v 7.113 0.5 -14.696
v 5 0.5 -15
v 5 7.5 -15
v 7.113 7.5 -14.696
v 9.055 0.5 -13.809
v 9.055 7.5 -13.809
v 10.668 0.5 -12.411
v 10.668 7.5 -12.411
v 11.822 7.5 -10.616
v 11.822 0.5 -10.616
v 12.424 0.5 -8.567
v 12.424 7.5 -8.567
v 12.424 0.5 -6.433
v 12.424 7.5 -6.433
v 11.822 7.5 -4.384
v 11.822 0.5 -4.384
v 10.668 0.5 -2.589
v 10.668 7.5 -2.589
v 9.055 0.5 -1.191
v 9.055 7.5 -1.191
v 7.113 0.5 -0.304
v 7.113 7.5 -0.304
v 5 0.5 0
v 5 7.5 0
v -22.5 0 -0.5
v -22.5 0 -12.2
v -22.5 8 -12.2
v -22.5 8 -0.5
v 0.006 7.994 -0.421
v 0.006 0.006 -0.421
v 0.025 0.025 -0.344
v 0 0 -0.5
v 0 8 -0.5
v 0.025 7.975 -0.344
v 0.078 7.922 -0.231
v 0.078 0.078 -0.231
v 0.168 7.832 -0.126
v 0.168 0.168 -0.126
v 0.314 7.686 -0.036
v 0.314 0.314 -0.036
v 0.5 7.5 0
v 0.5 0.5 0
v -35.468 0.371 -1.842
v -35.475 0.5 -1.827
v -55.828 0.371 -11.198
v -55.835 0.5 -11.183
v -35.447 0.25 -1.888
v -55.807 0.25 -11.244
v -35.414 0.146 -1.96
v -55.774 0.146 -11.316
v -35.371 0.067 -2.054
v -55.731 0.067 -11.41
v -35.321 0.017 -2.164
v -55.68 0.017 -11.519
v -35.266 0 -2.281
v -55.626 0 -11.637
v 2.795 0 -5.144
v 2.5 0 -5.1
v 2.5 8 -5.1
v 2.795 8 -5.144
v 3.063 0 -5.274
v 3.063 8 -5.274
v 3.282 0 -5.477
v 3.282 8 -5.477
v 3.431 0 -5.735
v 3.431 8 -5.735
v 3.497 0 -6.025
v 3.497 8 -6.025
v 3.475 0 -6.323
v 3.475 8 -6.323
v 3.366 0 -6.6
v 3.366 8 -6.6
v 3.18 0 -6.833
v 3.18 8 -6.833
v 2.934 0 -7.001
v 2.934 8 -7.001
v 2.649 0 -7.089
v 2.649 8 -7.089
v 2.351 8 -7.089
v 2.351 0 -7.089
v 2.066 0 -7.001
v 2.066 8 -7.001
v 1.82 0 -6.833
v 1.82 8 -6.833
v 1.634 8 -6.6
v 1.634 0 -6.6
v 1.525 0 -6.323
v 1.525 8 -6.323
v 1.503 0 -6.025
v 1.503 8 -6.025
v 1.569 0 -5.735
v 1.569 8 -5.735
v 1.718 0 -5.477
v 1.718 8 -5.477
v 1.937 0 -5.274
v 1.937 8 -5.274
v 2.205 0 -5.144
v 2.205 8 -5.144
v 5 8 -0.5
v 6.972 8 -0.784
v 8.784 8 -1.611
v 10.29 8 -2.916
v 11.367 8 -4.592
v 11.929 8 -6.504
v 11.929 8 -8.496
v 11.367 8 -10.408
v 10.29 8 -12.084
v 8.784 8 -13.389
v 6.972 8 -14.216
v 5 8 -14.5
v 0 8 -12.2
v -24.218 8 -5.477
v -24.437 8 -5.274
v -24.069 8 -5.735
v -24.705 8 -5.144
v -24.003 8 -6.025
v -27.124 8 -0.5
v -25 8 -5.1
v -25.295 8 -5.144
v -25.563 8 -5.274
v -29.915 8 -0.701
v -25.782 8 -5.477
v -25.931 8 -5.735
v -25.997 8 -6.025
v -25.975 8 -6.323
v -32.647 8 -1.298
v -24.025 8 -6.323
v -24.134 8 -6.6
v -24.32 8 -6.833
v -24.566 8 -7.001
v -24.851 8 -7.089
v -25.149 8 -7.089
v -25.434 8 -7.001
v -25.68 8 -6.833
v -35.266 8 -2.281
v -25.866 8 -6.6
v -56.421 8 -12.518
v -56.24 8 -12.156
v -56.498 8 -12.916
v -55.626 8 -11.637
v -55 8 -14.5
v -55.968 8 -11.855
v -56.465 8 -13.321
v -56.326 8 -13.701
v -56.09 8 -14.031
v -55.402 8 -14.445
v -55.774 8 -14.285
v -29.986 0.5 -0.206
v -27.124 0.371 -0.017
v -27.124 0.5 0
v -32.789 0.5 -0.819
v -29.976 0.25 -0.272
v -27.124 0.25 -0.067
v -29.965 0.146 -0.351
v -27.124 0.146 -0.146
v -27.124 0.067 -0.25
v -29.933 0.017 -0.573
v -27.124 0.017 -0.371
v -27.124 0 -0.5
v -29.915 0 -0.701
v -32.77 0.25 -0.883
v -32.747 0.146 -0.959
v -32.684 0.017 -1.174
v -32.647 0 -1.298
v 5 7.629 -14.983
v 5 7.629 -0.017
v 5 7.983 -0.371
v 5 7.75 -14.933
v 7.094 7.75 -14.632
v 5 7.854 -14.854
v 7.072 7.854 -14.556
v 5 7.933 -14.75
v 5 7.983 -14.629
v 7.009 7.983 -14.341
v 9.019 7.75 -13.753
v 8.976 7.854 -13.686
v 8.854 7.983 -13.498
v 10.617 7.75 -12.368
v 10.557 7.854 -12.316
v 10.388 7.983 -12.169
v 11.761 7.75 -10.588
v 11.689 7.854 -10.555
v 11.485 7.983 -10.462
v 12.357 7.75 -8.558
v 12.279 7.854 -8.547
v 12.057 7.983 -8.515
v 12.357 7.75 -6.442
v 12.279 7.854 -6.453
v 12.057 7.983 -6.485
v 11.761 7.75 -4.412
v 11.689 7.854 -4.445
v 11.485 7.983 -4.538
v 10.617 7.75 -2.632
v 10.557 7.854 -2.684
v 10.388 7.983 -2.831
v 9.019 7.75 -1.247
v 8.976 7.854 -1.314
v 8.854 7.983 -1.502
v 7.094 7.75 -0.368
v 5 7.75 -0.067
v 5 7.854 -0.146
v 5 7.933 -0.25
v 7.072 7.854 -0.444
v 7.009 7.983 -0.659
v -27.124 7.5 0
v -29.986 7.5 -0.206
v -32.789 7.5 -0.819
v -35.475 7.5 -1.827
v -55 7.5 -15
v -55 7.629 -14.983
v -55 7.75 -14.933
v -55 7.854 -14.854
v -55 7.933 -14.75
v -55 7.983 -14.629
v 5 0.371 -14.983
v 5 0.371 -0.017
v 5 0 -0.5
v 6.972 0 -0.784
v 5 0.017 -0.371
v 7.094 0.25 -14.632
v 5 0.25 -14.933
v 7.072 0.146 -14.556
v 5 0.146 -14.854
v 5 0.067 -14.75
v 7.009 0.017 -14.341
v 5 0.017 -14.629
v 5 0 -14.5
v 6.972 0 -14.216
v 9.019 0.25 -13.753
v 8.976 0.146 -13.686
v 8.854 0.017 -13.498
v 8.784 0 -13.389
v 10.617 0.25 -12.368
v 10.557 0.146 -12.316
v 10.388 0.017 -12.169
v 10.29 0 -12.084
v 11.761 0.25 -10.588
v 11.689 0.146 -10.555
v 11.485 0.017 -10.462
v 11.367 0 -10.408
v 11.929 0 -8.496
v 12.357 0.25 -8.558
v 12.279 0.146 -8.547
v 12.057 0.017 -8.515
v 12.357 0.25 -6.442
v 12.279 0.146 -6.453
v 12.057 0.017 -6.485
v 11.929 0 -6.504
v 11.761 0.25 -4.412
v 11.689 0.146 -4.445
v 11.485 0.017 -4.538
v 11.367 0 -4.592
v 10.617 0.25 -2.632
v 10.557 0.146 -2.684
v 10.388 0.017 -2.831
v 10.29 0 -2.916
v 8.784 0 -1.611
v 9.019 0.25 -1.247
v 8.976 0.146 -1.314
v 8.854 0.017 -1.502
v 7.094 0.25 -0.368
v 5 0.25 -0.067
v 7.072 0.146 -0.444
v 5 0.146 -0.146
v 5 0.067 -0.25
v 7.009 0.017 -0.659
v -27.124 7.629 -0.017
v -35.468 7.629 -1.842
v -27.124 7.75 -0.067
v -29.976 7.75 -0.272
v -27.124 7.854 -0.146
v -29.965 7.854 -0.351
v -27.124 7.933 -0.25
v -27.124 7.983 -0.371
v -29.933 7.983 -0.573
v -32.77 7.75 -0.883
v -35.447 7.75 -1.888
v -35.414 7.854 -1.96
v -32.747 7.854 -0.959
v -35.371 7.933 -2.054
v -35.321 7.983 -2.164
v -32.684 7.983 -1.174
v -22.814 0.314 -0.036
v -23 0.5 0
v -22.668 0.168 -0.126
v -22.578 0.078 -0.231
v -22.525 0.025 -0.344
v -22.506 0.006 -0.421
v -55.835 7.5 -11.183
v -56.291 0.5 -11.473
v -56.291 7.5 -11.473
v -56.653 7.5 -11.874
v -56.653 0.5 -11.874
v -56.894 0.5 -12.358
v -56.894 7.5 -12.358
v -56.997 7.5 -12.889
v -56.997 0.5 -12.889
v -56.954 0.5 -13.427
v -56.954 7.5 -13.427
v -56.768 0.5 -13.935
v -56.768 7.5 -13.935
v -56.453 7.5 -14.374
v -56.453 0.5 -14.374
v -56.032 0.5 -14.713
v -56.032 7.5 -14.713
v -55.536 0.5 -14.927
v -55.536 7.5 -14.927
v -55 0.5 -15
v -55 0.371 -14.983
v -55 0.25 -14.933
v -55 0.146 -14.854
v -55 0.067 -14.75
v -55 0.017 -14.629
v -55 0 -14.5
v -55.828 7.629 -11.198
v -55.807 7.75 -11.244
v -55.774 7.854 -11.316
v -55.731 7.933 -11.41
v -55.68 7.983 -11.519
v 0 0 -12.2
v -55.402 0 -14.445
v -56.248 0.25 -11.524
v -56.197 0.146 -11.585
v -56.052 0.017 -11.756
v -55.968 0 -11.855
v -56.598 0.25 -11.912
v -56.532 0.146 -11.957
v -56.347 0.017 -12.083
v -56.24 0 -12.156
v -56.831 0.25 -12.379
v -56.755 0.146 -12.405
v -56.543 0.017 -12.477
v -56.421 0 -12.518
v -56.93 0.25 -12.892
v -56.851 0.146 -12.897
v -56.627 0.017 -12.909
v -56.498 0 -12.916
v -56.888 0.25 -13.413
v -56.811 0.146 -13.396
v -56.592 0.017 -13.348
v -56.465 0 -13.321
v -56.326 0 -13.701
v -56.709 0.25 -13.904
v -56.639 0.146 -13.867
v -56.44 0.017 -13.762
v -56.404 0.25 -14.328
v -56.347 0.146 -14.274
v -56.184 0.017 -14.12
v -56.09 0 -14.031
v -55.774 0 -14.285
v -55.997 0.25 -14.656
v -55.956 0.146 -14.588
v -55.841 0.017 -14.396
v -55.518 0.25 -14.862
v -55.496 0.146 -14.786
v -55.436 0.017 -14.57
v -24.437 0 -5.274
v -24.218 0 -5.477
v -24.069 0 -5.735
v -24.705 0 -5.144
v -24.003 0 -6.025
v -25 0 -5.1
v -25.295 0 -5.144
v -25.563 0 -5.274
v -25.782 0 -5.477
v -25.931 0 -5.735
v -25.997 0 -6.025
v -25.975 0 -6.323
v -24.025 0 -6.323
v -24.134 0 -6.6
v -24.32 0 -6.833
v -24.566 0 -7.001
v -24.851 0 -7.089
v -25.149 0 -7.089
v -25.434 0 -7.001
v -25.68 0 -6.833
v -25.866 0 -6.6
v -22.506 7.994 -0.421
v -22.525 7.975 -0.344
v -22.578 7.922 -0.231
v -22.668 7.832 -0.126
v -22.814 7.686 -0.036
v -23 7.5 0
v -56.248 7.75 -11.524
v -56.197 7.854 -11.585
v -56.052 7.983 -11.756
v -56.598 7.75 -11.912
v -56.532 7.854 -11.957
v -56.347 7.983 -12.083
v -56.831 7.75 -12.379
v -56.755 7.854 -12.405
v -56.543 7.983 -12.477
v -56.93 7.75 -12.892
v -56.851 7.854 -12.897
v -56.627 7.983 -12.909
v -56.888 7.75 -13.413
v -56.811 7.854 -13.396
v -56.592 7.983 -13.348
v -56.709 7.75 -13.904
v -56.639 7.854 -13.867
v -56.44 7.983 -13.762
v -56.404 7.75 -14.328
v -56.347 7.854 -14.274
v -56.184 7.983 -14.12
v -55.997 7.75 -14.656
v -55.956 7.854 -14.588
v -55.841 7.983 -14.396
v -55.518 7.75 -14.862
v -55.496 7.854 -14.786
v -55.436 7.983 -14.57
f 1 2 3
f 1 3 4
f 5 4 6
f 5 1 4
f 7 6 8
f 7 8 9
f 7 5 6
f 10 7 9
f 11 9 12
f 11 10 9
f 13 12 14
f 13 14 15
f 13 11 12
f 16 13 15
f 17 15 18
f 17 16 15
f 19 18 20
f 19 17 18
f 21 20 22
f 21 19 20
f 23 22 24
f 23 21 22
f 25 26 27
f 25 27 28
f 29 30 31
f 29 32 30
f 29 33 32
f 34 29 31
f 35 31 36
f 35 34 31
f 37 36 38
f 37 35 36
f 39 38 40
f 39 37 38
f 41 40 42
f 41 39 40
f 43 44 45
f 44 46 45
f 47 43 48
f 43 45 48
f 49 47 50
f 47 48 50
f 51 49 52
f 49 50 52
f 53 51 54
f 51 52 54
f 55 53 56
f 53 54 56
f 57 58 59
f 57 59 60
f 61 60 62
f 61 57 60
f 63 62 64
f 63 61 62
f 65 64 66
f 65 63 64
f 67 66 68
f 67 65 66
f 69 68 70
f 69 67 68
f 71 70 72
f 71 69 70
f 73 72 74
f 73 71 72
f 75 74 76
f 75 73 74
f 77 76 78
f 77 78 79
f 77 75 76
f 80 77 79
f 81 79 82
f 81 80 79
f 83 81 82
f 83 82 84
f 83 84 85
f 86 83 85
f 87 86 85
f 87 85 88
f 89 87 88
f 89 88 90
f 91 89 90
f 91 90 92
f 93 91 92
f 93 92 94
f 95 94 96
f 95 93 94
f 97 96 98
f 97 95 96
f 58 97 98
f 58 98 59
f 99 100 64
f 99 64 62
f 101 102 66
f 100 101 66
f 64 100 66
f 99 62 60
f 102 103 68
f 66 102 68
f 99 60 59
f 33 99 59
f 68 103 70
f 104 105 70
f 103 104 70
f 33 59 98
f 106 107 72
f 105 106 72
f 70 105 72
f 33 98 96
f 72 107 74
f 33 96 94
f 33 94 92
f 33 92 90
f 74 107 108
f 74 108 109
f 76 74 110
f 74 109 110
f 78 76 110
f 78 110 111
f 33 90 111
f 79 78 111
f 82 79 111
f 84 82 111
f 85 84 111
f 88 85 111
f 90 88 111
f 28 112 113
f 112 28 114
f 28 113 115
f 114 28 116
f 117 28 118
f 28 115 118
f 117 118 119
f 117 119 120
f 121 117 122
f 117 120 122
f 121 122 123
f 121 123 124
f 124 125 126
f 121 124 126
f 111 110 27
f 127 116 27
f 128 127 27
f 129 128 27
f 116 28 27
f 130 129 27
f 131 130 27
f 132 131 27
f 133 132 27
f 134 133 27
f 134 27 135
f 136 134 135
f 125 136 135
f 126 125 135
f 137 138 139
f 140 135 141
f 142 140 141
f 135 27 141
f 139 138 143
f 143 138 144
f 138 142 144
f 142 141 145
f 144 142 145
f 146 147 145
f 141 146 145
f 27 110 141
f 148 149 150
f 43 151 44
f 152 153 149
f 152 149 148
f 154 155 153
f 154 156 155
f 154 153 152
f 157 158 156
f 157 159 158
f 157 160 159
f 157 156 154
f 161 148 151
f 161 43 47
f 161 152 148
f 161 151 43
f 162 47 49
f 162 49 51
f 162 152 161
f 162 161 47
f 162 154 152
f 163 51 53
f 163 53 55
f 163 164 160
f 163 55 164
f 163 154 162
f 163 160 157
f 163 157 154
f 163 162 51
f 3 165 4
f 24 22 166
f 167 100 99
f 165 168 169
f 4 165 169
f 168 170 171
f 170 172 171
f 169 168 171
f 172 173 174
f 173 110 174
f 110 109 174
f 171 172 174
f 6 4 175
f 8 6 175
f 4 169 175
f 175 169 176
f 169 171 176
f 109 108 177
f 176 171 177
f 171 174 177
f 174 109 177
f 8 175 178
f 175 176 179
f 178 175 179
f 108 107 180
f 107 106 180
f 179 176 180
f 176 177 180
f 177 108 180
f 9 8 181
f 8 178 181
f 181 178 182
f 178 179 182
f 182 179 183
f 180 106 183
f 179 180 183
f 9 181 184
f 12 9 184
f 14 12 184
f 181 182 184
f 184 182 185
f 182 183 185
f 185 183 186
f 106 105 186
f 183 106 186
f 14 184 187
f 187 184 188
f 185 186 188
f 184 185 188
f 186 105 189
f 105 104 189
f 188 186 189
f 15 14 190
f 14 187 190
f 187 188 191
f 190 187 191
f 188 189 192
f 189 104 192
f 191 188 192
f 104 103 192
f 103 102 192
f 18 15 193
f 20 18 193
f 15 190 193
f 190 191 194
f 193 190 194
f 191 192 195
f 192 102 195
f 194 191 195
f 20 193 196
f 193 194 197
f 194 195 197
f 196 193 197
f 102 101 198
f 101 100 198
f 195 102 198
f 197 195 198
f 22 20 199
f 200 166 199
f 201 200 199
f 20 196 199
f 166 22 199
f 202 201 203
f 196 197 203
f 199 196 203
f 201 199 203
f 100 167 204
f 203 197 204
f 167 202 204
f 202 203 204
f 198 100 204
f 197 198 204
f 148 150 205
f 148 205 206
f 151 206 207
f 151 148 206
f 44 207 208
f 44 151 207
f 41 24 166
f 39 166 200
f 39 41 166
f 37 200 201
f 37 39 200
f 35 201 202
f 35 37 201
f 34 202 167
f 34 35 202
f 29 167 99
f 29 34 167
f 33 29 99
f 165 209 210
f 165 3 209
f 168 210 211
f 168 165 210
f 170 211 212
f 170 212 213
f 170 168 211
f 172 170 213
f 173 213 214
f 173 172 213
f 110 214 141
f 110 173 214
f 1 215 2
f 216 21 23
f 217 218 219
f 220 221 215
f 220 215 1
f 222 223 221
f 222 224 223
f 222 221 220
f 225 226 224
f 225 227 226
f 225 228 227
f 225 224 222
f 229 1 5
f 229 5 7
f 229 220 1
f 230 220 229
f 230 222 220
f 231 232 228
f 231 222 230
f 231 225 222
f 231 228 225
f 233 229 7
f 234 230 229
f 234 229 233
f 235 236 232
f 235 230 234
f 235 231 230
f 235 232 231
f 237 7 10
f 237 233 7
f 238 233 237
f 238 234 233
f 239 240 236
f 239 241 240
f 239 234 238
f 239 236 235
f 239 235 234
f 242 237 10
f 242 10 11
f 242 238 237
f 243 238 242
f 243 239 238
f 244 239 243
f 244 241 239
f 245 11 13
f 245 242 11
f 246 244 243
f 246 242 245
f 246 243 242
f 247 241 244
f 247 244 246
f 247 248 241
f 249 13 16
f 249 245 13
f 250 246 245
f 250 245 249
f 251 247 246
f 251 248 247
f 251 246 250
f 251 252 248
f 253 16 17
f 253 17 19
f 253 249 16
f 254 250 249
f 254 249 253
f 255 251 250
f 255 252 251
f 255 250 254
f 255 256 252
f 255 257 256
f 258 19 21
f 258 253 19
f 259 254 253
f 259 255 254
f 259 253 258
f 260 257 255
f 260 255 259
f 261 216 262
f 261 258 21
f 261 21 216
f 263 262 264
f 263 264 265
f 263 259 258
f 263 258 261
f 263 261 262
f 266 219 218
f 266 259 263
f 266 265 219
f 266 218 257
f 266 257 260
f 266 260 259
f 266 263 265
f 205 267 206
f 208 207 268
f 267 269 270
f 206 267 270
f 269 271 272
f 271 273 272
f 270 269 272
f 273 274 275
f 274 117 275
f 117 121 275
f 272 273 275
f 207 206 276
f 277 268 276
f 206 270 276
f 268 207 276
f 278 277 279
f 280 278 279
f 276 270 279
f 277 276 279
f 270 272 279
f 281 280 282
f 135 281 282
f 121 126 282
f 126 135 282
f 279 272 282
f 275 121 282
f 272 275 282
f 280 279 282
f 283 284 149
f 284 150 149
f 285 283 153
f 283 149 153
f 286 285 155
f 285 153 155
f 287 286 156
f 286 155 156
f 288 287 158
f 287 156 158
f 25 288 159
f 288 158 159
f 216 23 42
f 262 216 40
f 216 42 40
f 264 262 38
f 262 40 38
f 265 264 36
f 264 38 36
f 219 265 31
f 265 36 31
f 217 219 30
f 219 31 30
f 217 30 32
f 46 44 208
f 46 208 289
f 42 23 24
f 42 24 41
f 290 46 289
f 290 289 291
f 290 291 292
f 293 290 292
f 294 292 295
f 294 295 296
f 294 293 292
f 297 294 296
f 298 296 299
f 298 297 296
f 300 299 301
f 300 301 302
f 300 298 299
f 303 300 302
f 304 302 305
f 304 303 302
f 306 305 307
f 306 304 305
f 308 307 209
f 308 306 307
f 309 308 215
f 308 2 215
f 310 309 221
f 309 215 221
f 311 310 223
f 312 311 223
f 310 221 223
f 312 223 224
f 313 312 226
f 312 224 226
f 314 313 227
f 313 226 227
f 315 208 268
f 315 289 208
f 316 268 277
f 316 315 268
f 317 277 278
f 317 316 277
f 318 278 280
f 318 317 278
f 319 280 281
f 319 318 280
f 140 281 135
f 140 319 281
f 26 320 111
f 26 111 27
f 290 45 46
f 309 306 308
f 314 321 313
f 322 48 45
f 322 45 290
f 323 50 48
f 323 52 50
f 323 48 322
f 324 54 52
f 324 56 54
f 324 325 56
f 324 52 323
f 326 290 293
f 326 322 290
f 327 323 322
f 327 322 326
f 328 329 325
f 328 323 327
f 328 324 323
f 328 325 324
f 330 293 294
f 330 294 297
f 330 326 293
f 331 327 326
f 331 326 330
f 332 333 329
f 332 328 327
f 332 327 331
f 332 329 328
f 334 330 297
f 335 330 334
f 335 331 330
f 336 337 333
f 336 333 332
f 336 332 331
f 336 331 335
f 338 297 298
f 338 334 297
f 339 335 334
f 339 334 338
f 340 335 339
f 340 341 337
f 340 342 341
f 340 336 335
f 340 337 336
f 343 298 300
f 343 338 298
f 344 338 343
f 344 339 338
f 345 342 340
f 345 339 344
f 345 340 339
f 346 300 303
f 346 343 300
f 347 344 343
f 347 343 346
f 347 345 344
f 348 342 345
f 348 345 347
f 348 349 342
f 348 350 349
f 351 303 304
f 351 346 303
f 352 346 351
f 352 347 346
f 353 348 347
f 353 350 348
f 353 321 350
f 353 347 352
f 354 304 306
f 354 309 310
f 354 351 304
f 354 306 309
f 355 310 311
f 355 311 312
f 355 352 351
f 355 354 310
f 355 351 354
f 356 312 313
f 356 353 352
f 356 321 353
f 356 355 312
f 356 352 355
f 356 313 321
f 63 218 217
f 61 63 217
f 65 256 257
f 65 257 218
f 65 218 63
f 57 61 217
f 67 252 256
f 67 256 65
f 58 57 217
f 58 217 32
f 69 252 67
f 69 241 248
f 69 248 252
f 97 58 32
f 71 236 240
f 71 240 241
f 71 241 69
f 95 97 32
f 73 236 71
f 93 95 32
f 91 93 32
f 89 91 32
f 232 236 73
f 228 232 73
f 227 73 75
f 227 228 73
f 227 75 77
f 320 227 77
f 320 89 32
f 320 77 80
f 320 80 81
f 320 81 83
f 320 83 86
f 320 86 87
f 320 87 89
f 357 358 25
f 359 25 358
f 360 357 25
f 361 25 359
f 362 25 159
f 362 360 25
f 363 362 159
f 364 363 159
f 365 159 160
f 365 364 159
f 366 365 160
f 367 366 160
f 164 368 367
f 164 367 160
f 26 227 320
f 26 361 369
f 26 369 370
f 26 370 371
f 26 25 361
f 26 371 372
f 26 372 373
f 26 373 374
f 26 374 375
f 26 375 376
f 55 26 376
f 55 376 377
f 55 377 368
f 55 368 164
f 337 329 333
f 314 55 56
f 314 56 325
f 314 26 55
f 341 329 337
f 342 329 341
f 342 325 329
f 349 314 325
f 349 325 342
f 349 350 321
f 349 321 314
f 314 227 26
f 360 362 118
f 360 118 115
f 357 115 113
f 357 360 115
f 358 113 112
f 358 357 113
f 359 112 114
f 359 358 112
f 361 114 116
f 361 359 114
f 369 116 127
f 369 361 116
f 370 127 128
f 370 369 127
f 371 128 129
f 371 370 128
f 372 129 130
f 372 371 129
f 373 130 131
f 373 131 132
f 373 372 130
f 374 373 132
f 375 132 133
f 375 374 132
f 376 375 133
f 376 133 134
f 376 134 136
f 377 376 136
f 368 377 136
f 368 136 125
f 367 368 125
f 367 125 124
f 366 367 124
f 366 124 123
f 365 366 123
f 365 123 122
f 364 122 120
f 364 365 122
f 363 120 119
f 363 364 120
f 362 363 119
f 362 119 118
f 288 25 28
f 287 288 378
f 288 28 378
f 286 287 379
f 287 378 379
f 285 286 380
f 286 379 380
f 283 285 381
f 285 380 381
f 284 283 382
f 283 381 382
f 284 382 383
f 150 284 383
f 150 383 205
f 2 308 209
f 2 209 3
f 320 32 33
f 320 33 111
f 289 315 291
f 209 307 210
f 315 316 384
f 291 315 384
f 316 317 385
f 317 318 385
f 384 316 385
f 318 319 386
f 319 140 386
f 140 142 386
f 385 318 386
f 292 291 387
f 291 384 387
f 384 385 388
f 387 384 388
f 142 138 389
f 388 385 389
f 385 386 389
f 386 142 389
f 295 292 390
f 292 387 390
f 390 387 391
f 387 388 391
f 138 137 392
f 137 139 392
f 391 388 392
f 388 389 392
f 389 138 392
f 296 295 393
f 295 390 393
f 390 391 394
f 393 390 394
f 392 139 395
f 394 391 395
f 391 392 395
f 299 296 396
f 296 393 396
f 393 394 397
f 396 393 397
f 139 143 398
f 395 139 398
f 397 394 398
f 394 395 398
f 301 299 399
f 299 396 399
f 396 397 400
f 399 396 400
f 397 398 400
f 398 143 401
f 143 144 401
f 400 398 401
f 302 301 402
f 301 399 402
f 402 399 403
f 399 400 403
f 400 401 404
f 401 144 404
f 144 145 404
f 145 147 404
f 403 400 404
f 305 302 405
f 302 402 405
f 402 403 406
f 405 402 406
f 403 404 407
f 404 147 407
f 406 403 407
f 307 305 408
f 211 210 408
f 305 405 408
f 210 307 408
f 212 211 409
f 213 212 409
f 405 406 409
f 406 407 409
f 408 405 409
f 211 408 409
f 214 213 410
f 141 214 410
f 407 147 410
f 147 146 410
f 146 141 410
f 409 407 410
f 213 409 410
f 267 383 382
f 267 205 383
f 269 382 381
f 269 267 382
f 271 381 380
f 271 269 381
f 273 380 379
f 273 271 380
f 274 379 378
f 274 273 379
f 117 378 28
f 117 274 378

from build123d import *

# Parameters (mm, degrees)
SKETCH_1_R      = 1
EXTRUDE_1_DEPTH = 8
FILLET_3_R      = 0.5


with BuildPart() as part:
    # 草圖1 → 填料-伸長1 (new body)
    with BuildSketch(Plane(origin=(0, 0, 0), x_dir=(1, 0, 0), z_dir=(0, 1, 0))):
        with BuildLine():
            Line((0, 0), (0, 12.2))
            Line((0, 12.2), (-22.5, 12.2))
            Line((-22.5, 12.2), (-22.5, 0))
            Line((-22.5, 0), (-27.124303732, 0))
            ThreePointArc((-27.124303732, 0), (-31.398520886, 0.462060812), (-35.475243216, 1.826893228))
            Line((-35.475243216, 1.826893228), (-55.835093948, 11.182689323))
            ThreePointArc((-55.835093948, 11.182689323), (-56.953793919, 13.427421715), (-55, 15))
            Line((-55, 15), (5, 15))
            ThreePointArc((5, 15), (12.5, 7.5), (5, 0))
            Line((5, 0), (0, 0))
        make_face()
        with Locations(Location((-25, 6.1, 0), (0, 0, 270))):
            Circle(SKETCH_1_R, mode=Mode.SUBTRACT)
        with Locations(Location((2.5, 6.1, 0), (0, 0, 270))):
            Circle(SKETCH_1_R, mode=Mode.SUBTRACT)
    extrude(amount=EXTRUDE_1_DEPTH)

    # 圓角3
    fillet_3_edges = [part.edges().sort_by_distance(p)[0] for p in [
        (-25, 8, -15),
        (-24.812151866, 0, 0),
        (-31.398520886, 0, -0.462060812),
        (-45.655168582, 0, -6.504791275),
        (-56.953793919, 0, -13.427421715),
        (-25, 0, -15),
        (12.5, 0, -7.5),
        (2.5, 0, 0),
        (-56.953793919, 8, -13.427421715),
        (-45.655168582, 8, -6.504791275),
        (0, 4, 0),
        (-22.5, 4, 0),
        (-31.398520886, 8, -0.462060812),
        (-24.812151866, 8, 0),
        (2.5, 8, 0),
        (12.5, 8, -7.5),
    ]]
    fillet(fillet_3_edges, radius=FILLET_3_R)


solid = part.part
